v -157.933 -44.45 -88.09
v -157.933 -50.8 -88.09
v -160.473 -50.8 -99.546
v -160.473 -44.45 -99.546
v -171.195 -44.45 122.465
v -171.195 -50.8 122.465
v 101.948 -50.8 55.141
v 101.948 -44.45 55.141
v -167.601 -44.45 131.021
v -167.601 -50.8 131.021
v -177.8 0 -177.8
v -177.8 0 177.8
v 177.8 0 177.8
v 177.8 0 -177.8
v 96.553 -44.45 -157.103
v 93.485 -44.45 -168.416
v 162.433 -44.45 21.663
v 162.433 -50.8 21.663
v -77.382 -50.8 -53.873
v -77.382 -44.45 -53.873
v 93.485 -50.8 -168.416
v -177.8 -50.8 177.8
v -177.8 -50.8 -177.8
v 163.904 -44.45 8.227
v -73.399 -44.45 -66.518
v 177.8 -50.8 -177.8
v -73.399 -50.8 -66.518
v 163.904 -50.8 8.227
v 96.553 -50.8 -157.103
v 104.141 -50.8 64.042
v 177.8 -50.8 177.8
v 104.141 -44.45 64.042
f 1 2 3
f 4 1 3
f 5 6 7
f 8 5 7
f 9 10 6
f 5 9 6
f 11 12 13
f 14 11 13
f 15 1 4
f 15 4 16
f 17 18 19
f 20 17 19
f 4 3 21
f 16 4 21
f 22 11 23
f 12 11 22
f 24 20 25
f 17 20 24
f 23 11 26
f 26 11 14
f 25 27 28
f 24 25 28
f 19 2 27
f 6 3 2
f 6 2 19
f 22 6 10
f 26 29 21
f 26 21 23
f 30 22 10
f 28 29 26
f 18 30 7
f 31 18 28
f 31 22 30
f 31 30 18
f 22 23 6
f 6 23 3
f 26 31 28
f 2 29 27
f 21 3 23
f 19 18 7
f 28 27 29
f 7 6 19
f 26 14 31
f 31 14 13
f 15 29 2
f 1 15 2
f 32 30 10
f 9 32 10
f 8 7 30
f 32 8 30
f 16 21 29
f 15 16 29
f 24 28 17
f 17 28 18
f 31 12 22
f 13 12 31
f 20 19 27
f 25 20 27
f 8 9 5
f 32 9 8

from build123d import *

# Parameters (mm, degrees)
F0_W     = 355.6
F0_H     = 355.6
F1_DEPTH = 50.8
F3_DEPTH = 6.35
F4_DEPTH = 6.35


with BuildPart() as f1:
    # F0 (on Front) → F1 (new body)
    with BuildSketch(Plane.XZ):
        Rectangle(F0_W, F0_H)
    extrude(amount=F1_DEPTH)

    # F2 (on face) → F3 (cut)
    with BuildSketch(Plane.XZ.offset(50.8)):
        Polygon((-167.600538, 131.020906), (-171.194881, 122.465245), (101.947516, 55.141423), (104.141387, 64.042271), align=None)
        Polygon((-77.381766, -53.872798), (-73.398896, -66.51783), (163.904211, 8.226743), (162.432873, 21.662845), align=None)
        Polygon((96.553348, -157.102942), (-157.932714, -88.089772), (-160.472856, -99.545852), (93.485428, -168.415896), align=None)
    extrude(amount=-F3_DEPTH, mode=Mode.SUBTRACT)

    # F2 (on face) → F4 (cut)
    with BuildSketch(Plane.XZ.offset(50.8)):
        Polygon((-167.600538, 131.020906), (-171.194881, 122.465245), (101.947516, 55.141423), (104.141387, 64.042271), align=None)
        Polygon((-77.381766, -53.872798), (-73.398896, -66.51783), (163.904211, 8.226743), (162.432873, 21.662845), align=None)
        Polygon((96.553348, -157.102942), (-157.932714, -88.089772), (-160.472856, -99.545852), (93.485428, -168.415896), align=None)
    extrude(amount=-F4_DEPTH, mode=Mode.SUBTRACT)


solid = f1.part
